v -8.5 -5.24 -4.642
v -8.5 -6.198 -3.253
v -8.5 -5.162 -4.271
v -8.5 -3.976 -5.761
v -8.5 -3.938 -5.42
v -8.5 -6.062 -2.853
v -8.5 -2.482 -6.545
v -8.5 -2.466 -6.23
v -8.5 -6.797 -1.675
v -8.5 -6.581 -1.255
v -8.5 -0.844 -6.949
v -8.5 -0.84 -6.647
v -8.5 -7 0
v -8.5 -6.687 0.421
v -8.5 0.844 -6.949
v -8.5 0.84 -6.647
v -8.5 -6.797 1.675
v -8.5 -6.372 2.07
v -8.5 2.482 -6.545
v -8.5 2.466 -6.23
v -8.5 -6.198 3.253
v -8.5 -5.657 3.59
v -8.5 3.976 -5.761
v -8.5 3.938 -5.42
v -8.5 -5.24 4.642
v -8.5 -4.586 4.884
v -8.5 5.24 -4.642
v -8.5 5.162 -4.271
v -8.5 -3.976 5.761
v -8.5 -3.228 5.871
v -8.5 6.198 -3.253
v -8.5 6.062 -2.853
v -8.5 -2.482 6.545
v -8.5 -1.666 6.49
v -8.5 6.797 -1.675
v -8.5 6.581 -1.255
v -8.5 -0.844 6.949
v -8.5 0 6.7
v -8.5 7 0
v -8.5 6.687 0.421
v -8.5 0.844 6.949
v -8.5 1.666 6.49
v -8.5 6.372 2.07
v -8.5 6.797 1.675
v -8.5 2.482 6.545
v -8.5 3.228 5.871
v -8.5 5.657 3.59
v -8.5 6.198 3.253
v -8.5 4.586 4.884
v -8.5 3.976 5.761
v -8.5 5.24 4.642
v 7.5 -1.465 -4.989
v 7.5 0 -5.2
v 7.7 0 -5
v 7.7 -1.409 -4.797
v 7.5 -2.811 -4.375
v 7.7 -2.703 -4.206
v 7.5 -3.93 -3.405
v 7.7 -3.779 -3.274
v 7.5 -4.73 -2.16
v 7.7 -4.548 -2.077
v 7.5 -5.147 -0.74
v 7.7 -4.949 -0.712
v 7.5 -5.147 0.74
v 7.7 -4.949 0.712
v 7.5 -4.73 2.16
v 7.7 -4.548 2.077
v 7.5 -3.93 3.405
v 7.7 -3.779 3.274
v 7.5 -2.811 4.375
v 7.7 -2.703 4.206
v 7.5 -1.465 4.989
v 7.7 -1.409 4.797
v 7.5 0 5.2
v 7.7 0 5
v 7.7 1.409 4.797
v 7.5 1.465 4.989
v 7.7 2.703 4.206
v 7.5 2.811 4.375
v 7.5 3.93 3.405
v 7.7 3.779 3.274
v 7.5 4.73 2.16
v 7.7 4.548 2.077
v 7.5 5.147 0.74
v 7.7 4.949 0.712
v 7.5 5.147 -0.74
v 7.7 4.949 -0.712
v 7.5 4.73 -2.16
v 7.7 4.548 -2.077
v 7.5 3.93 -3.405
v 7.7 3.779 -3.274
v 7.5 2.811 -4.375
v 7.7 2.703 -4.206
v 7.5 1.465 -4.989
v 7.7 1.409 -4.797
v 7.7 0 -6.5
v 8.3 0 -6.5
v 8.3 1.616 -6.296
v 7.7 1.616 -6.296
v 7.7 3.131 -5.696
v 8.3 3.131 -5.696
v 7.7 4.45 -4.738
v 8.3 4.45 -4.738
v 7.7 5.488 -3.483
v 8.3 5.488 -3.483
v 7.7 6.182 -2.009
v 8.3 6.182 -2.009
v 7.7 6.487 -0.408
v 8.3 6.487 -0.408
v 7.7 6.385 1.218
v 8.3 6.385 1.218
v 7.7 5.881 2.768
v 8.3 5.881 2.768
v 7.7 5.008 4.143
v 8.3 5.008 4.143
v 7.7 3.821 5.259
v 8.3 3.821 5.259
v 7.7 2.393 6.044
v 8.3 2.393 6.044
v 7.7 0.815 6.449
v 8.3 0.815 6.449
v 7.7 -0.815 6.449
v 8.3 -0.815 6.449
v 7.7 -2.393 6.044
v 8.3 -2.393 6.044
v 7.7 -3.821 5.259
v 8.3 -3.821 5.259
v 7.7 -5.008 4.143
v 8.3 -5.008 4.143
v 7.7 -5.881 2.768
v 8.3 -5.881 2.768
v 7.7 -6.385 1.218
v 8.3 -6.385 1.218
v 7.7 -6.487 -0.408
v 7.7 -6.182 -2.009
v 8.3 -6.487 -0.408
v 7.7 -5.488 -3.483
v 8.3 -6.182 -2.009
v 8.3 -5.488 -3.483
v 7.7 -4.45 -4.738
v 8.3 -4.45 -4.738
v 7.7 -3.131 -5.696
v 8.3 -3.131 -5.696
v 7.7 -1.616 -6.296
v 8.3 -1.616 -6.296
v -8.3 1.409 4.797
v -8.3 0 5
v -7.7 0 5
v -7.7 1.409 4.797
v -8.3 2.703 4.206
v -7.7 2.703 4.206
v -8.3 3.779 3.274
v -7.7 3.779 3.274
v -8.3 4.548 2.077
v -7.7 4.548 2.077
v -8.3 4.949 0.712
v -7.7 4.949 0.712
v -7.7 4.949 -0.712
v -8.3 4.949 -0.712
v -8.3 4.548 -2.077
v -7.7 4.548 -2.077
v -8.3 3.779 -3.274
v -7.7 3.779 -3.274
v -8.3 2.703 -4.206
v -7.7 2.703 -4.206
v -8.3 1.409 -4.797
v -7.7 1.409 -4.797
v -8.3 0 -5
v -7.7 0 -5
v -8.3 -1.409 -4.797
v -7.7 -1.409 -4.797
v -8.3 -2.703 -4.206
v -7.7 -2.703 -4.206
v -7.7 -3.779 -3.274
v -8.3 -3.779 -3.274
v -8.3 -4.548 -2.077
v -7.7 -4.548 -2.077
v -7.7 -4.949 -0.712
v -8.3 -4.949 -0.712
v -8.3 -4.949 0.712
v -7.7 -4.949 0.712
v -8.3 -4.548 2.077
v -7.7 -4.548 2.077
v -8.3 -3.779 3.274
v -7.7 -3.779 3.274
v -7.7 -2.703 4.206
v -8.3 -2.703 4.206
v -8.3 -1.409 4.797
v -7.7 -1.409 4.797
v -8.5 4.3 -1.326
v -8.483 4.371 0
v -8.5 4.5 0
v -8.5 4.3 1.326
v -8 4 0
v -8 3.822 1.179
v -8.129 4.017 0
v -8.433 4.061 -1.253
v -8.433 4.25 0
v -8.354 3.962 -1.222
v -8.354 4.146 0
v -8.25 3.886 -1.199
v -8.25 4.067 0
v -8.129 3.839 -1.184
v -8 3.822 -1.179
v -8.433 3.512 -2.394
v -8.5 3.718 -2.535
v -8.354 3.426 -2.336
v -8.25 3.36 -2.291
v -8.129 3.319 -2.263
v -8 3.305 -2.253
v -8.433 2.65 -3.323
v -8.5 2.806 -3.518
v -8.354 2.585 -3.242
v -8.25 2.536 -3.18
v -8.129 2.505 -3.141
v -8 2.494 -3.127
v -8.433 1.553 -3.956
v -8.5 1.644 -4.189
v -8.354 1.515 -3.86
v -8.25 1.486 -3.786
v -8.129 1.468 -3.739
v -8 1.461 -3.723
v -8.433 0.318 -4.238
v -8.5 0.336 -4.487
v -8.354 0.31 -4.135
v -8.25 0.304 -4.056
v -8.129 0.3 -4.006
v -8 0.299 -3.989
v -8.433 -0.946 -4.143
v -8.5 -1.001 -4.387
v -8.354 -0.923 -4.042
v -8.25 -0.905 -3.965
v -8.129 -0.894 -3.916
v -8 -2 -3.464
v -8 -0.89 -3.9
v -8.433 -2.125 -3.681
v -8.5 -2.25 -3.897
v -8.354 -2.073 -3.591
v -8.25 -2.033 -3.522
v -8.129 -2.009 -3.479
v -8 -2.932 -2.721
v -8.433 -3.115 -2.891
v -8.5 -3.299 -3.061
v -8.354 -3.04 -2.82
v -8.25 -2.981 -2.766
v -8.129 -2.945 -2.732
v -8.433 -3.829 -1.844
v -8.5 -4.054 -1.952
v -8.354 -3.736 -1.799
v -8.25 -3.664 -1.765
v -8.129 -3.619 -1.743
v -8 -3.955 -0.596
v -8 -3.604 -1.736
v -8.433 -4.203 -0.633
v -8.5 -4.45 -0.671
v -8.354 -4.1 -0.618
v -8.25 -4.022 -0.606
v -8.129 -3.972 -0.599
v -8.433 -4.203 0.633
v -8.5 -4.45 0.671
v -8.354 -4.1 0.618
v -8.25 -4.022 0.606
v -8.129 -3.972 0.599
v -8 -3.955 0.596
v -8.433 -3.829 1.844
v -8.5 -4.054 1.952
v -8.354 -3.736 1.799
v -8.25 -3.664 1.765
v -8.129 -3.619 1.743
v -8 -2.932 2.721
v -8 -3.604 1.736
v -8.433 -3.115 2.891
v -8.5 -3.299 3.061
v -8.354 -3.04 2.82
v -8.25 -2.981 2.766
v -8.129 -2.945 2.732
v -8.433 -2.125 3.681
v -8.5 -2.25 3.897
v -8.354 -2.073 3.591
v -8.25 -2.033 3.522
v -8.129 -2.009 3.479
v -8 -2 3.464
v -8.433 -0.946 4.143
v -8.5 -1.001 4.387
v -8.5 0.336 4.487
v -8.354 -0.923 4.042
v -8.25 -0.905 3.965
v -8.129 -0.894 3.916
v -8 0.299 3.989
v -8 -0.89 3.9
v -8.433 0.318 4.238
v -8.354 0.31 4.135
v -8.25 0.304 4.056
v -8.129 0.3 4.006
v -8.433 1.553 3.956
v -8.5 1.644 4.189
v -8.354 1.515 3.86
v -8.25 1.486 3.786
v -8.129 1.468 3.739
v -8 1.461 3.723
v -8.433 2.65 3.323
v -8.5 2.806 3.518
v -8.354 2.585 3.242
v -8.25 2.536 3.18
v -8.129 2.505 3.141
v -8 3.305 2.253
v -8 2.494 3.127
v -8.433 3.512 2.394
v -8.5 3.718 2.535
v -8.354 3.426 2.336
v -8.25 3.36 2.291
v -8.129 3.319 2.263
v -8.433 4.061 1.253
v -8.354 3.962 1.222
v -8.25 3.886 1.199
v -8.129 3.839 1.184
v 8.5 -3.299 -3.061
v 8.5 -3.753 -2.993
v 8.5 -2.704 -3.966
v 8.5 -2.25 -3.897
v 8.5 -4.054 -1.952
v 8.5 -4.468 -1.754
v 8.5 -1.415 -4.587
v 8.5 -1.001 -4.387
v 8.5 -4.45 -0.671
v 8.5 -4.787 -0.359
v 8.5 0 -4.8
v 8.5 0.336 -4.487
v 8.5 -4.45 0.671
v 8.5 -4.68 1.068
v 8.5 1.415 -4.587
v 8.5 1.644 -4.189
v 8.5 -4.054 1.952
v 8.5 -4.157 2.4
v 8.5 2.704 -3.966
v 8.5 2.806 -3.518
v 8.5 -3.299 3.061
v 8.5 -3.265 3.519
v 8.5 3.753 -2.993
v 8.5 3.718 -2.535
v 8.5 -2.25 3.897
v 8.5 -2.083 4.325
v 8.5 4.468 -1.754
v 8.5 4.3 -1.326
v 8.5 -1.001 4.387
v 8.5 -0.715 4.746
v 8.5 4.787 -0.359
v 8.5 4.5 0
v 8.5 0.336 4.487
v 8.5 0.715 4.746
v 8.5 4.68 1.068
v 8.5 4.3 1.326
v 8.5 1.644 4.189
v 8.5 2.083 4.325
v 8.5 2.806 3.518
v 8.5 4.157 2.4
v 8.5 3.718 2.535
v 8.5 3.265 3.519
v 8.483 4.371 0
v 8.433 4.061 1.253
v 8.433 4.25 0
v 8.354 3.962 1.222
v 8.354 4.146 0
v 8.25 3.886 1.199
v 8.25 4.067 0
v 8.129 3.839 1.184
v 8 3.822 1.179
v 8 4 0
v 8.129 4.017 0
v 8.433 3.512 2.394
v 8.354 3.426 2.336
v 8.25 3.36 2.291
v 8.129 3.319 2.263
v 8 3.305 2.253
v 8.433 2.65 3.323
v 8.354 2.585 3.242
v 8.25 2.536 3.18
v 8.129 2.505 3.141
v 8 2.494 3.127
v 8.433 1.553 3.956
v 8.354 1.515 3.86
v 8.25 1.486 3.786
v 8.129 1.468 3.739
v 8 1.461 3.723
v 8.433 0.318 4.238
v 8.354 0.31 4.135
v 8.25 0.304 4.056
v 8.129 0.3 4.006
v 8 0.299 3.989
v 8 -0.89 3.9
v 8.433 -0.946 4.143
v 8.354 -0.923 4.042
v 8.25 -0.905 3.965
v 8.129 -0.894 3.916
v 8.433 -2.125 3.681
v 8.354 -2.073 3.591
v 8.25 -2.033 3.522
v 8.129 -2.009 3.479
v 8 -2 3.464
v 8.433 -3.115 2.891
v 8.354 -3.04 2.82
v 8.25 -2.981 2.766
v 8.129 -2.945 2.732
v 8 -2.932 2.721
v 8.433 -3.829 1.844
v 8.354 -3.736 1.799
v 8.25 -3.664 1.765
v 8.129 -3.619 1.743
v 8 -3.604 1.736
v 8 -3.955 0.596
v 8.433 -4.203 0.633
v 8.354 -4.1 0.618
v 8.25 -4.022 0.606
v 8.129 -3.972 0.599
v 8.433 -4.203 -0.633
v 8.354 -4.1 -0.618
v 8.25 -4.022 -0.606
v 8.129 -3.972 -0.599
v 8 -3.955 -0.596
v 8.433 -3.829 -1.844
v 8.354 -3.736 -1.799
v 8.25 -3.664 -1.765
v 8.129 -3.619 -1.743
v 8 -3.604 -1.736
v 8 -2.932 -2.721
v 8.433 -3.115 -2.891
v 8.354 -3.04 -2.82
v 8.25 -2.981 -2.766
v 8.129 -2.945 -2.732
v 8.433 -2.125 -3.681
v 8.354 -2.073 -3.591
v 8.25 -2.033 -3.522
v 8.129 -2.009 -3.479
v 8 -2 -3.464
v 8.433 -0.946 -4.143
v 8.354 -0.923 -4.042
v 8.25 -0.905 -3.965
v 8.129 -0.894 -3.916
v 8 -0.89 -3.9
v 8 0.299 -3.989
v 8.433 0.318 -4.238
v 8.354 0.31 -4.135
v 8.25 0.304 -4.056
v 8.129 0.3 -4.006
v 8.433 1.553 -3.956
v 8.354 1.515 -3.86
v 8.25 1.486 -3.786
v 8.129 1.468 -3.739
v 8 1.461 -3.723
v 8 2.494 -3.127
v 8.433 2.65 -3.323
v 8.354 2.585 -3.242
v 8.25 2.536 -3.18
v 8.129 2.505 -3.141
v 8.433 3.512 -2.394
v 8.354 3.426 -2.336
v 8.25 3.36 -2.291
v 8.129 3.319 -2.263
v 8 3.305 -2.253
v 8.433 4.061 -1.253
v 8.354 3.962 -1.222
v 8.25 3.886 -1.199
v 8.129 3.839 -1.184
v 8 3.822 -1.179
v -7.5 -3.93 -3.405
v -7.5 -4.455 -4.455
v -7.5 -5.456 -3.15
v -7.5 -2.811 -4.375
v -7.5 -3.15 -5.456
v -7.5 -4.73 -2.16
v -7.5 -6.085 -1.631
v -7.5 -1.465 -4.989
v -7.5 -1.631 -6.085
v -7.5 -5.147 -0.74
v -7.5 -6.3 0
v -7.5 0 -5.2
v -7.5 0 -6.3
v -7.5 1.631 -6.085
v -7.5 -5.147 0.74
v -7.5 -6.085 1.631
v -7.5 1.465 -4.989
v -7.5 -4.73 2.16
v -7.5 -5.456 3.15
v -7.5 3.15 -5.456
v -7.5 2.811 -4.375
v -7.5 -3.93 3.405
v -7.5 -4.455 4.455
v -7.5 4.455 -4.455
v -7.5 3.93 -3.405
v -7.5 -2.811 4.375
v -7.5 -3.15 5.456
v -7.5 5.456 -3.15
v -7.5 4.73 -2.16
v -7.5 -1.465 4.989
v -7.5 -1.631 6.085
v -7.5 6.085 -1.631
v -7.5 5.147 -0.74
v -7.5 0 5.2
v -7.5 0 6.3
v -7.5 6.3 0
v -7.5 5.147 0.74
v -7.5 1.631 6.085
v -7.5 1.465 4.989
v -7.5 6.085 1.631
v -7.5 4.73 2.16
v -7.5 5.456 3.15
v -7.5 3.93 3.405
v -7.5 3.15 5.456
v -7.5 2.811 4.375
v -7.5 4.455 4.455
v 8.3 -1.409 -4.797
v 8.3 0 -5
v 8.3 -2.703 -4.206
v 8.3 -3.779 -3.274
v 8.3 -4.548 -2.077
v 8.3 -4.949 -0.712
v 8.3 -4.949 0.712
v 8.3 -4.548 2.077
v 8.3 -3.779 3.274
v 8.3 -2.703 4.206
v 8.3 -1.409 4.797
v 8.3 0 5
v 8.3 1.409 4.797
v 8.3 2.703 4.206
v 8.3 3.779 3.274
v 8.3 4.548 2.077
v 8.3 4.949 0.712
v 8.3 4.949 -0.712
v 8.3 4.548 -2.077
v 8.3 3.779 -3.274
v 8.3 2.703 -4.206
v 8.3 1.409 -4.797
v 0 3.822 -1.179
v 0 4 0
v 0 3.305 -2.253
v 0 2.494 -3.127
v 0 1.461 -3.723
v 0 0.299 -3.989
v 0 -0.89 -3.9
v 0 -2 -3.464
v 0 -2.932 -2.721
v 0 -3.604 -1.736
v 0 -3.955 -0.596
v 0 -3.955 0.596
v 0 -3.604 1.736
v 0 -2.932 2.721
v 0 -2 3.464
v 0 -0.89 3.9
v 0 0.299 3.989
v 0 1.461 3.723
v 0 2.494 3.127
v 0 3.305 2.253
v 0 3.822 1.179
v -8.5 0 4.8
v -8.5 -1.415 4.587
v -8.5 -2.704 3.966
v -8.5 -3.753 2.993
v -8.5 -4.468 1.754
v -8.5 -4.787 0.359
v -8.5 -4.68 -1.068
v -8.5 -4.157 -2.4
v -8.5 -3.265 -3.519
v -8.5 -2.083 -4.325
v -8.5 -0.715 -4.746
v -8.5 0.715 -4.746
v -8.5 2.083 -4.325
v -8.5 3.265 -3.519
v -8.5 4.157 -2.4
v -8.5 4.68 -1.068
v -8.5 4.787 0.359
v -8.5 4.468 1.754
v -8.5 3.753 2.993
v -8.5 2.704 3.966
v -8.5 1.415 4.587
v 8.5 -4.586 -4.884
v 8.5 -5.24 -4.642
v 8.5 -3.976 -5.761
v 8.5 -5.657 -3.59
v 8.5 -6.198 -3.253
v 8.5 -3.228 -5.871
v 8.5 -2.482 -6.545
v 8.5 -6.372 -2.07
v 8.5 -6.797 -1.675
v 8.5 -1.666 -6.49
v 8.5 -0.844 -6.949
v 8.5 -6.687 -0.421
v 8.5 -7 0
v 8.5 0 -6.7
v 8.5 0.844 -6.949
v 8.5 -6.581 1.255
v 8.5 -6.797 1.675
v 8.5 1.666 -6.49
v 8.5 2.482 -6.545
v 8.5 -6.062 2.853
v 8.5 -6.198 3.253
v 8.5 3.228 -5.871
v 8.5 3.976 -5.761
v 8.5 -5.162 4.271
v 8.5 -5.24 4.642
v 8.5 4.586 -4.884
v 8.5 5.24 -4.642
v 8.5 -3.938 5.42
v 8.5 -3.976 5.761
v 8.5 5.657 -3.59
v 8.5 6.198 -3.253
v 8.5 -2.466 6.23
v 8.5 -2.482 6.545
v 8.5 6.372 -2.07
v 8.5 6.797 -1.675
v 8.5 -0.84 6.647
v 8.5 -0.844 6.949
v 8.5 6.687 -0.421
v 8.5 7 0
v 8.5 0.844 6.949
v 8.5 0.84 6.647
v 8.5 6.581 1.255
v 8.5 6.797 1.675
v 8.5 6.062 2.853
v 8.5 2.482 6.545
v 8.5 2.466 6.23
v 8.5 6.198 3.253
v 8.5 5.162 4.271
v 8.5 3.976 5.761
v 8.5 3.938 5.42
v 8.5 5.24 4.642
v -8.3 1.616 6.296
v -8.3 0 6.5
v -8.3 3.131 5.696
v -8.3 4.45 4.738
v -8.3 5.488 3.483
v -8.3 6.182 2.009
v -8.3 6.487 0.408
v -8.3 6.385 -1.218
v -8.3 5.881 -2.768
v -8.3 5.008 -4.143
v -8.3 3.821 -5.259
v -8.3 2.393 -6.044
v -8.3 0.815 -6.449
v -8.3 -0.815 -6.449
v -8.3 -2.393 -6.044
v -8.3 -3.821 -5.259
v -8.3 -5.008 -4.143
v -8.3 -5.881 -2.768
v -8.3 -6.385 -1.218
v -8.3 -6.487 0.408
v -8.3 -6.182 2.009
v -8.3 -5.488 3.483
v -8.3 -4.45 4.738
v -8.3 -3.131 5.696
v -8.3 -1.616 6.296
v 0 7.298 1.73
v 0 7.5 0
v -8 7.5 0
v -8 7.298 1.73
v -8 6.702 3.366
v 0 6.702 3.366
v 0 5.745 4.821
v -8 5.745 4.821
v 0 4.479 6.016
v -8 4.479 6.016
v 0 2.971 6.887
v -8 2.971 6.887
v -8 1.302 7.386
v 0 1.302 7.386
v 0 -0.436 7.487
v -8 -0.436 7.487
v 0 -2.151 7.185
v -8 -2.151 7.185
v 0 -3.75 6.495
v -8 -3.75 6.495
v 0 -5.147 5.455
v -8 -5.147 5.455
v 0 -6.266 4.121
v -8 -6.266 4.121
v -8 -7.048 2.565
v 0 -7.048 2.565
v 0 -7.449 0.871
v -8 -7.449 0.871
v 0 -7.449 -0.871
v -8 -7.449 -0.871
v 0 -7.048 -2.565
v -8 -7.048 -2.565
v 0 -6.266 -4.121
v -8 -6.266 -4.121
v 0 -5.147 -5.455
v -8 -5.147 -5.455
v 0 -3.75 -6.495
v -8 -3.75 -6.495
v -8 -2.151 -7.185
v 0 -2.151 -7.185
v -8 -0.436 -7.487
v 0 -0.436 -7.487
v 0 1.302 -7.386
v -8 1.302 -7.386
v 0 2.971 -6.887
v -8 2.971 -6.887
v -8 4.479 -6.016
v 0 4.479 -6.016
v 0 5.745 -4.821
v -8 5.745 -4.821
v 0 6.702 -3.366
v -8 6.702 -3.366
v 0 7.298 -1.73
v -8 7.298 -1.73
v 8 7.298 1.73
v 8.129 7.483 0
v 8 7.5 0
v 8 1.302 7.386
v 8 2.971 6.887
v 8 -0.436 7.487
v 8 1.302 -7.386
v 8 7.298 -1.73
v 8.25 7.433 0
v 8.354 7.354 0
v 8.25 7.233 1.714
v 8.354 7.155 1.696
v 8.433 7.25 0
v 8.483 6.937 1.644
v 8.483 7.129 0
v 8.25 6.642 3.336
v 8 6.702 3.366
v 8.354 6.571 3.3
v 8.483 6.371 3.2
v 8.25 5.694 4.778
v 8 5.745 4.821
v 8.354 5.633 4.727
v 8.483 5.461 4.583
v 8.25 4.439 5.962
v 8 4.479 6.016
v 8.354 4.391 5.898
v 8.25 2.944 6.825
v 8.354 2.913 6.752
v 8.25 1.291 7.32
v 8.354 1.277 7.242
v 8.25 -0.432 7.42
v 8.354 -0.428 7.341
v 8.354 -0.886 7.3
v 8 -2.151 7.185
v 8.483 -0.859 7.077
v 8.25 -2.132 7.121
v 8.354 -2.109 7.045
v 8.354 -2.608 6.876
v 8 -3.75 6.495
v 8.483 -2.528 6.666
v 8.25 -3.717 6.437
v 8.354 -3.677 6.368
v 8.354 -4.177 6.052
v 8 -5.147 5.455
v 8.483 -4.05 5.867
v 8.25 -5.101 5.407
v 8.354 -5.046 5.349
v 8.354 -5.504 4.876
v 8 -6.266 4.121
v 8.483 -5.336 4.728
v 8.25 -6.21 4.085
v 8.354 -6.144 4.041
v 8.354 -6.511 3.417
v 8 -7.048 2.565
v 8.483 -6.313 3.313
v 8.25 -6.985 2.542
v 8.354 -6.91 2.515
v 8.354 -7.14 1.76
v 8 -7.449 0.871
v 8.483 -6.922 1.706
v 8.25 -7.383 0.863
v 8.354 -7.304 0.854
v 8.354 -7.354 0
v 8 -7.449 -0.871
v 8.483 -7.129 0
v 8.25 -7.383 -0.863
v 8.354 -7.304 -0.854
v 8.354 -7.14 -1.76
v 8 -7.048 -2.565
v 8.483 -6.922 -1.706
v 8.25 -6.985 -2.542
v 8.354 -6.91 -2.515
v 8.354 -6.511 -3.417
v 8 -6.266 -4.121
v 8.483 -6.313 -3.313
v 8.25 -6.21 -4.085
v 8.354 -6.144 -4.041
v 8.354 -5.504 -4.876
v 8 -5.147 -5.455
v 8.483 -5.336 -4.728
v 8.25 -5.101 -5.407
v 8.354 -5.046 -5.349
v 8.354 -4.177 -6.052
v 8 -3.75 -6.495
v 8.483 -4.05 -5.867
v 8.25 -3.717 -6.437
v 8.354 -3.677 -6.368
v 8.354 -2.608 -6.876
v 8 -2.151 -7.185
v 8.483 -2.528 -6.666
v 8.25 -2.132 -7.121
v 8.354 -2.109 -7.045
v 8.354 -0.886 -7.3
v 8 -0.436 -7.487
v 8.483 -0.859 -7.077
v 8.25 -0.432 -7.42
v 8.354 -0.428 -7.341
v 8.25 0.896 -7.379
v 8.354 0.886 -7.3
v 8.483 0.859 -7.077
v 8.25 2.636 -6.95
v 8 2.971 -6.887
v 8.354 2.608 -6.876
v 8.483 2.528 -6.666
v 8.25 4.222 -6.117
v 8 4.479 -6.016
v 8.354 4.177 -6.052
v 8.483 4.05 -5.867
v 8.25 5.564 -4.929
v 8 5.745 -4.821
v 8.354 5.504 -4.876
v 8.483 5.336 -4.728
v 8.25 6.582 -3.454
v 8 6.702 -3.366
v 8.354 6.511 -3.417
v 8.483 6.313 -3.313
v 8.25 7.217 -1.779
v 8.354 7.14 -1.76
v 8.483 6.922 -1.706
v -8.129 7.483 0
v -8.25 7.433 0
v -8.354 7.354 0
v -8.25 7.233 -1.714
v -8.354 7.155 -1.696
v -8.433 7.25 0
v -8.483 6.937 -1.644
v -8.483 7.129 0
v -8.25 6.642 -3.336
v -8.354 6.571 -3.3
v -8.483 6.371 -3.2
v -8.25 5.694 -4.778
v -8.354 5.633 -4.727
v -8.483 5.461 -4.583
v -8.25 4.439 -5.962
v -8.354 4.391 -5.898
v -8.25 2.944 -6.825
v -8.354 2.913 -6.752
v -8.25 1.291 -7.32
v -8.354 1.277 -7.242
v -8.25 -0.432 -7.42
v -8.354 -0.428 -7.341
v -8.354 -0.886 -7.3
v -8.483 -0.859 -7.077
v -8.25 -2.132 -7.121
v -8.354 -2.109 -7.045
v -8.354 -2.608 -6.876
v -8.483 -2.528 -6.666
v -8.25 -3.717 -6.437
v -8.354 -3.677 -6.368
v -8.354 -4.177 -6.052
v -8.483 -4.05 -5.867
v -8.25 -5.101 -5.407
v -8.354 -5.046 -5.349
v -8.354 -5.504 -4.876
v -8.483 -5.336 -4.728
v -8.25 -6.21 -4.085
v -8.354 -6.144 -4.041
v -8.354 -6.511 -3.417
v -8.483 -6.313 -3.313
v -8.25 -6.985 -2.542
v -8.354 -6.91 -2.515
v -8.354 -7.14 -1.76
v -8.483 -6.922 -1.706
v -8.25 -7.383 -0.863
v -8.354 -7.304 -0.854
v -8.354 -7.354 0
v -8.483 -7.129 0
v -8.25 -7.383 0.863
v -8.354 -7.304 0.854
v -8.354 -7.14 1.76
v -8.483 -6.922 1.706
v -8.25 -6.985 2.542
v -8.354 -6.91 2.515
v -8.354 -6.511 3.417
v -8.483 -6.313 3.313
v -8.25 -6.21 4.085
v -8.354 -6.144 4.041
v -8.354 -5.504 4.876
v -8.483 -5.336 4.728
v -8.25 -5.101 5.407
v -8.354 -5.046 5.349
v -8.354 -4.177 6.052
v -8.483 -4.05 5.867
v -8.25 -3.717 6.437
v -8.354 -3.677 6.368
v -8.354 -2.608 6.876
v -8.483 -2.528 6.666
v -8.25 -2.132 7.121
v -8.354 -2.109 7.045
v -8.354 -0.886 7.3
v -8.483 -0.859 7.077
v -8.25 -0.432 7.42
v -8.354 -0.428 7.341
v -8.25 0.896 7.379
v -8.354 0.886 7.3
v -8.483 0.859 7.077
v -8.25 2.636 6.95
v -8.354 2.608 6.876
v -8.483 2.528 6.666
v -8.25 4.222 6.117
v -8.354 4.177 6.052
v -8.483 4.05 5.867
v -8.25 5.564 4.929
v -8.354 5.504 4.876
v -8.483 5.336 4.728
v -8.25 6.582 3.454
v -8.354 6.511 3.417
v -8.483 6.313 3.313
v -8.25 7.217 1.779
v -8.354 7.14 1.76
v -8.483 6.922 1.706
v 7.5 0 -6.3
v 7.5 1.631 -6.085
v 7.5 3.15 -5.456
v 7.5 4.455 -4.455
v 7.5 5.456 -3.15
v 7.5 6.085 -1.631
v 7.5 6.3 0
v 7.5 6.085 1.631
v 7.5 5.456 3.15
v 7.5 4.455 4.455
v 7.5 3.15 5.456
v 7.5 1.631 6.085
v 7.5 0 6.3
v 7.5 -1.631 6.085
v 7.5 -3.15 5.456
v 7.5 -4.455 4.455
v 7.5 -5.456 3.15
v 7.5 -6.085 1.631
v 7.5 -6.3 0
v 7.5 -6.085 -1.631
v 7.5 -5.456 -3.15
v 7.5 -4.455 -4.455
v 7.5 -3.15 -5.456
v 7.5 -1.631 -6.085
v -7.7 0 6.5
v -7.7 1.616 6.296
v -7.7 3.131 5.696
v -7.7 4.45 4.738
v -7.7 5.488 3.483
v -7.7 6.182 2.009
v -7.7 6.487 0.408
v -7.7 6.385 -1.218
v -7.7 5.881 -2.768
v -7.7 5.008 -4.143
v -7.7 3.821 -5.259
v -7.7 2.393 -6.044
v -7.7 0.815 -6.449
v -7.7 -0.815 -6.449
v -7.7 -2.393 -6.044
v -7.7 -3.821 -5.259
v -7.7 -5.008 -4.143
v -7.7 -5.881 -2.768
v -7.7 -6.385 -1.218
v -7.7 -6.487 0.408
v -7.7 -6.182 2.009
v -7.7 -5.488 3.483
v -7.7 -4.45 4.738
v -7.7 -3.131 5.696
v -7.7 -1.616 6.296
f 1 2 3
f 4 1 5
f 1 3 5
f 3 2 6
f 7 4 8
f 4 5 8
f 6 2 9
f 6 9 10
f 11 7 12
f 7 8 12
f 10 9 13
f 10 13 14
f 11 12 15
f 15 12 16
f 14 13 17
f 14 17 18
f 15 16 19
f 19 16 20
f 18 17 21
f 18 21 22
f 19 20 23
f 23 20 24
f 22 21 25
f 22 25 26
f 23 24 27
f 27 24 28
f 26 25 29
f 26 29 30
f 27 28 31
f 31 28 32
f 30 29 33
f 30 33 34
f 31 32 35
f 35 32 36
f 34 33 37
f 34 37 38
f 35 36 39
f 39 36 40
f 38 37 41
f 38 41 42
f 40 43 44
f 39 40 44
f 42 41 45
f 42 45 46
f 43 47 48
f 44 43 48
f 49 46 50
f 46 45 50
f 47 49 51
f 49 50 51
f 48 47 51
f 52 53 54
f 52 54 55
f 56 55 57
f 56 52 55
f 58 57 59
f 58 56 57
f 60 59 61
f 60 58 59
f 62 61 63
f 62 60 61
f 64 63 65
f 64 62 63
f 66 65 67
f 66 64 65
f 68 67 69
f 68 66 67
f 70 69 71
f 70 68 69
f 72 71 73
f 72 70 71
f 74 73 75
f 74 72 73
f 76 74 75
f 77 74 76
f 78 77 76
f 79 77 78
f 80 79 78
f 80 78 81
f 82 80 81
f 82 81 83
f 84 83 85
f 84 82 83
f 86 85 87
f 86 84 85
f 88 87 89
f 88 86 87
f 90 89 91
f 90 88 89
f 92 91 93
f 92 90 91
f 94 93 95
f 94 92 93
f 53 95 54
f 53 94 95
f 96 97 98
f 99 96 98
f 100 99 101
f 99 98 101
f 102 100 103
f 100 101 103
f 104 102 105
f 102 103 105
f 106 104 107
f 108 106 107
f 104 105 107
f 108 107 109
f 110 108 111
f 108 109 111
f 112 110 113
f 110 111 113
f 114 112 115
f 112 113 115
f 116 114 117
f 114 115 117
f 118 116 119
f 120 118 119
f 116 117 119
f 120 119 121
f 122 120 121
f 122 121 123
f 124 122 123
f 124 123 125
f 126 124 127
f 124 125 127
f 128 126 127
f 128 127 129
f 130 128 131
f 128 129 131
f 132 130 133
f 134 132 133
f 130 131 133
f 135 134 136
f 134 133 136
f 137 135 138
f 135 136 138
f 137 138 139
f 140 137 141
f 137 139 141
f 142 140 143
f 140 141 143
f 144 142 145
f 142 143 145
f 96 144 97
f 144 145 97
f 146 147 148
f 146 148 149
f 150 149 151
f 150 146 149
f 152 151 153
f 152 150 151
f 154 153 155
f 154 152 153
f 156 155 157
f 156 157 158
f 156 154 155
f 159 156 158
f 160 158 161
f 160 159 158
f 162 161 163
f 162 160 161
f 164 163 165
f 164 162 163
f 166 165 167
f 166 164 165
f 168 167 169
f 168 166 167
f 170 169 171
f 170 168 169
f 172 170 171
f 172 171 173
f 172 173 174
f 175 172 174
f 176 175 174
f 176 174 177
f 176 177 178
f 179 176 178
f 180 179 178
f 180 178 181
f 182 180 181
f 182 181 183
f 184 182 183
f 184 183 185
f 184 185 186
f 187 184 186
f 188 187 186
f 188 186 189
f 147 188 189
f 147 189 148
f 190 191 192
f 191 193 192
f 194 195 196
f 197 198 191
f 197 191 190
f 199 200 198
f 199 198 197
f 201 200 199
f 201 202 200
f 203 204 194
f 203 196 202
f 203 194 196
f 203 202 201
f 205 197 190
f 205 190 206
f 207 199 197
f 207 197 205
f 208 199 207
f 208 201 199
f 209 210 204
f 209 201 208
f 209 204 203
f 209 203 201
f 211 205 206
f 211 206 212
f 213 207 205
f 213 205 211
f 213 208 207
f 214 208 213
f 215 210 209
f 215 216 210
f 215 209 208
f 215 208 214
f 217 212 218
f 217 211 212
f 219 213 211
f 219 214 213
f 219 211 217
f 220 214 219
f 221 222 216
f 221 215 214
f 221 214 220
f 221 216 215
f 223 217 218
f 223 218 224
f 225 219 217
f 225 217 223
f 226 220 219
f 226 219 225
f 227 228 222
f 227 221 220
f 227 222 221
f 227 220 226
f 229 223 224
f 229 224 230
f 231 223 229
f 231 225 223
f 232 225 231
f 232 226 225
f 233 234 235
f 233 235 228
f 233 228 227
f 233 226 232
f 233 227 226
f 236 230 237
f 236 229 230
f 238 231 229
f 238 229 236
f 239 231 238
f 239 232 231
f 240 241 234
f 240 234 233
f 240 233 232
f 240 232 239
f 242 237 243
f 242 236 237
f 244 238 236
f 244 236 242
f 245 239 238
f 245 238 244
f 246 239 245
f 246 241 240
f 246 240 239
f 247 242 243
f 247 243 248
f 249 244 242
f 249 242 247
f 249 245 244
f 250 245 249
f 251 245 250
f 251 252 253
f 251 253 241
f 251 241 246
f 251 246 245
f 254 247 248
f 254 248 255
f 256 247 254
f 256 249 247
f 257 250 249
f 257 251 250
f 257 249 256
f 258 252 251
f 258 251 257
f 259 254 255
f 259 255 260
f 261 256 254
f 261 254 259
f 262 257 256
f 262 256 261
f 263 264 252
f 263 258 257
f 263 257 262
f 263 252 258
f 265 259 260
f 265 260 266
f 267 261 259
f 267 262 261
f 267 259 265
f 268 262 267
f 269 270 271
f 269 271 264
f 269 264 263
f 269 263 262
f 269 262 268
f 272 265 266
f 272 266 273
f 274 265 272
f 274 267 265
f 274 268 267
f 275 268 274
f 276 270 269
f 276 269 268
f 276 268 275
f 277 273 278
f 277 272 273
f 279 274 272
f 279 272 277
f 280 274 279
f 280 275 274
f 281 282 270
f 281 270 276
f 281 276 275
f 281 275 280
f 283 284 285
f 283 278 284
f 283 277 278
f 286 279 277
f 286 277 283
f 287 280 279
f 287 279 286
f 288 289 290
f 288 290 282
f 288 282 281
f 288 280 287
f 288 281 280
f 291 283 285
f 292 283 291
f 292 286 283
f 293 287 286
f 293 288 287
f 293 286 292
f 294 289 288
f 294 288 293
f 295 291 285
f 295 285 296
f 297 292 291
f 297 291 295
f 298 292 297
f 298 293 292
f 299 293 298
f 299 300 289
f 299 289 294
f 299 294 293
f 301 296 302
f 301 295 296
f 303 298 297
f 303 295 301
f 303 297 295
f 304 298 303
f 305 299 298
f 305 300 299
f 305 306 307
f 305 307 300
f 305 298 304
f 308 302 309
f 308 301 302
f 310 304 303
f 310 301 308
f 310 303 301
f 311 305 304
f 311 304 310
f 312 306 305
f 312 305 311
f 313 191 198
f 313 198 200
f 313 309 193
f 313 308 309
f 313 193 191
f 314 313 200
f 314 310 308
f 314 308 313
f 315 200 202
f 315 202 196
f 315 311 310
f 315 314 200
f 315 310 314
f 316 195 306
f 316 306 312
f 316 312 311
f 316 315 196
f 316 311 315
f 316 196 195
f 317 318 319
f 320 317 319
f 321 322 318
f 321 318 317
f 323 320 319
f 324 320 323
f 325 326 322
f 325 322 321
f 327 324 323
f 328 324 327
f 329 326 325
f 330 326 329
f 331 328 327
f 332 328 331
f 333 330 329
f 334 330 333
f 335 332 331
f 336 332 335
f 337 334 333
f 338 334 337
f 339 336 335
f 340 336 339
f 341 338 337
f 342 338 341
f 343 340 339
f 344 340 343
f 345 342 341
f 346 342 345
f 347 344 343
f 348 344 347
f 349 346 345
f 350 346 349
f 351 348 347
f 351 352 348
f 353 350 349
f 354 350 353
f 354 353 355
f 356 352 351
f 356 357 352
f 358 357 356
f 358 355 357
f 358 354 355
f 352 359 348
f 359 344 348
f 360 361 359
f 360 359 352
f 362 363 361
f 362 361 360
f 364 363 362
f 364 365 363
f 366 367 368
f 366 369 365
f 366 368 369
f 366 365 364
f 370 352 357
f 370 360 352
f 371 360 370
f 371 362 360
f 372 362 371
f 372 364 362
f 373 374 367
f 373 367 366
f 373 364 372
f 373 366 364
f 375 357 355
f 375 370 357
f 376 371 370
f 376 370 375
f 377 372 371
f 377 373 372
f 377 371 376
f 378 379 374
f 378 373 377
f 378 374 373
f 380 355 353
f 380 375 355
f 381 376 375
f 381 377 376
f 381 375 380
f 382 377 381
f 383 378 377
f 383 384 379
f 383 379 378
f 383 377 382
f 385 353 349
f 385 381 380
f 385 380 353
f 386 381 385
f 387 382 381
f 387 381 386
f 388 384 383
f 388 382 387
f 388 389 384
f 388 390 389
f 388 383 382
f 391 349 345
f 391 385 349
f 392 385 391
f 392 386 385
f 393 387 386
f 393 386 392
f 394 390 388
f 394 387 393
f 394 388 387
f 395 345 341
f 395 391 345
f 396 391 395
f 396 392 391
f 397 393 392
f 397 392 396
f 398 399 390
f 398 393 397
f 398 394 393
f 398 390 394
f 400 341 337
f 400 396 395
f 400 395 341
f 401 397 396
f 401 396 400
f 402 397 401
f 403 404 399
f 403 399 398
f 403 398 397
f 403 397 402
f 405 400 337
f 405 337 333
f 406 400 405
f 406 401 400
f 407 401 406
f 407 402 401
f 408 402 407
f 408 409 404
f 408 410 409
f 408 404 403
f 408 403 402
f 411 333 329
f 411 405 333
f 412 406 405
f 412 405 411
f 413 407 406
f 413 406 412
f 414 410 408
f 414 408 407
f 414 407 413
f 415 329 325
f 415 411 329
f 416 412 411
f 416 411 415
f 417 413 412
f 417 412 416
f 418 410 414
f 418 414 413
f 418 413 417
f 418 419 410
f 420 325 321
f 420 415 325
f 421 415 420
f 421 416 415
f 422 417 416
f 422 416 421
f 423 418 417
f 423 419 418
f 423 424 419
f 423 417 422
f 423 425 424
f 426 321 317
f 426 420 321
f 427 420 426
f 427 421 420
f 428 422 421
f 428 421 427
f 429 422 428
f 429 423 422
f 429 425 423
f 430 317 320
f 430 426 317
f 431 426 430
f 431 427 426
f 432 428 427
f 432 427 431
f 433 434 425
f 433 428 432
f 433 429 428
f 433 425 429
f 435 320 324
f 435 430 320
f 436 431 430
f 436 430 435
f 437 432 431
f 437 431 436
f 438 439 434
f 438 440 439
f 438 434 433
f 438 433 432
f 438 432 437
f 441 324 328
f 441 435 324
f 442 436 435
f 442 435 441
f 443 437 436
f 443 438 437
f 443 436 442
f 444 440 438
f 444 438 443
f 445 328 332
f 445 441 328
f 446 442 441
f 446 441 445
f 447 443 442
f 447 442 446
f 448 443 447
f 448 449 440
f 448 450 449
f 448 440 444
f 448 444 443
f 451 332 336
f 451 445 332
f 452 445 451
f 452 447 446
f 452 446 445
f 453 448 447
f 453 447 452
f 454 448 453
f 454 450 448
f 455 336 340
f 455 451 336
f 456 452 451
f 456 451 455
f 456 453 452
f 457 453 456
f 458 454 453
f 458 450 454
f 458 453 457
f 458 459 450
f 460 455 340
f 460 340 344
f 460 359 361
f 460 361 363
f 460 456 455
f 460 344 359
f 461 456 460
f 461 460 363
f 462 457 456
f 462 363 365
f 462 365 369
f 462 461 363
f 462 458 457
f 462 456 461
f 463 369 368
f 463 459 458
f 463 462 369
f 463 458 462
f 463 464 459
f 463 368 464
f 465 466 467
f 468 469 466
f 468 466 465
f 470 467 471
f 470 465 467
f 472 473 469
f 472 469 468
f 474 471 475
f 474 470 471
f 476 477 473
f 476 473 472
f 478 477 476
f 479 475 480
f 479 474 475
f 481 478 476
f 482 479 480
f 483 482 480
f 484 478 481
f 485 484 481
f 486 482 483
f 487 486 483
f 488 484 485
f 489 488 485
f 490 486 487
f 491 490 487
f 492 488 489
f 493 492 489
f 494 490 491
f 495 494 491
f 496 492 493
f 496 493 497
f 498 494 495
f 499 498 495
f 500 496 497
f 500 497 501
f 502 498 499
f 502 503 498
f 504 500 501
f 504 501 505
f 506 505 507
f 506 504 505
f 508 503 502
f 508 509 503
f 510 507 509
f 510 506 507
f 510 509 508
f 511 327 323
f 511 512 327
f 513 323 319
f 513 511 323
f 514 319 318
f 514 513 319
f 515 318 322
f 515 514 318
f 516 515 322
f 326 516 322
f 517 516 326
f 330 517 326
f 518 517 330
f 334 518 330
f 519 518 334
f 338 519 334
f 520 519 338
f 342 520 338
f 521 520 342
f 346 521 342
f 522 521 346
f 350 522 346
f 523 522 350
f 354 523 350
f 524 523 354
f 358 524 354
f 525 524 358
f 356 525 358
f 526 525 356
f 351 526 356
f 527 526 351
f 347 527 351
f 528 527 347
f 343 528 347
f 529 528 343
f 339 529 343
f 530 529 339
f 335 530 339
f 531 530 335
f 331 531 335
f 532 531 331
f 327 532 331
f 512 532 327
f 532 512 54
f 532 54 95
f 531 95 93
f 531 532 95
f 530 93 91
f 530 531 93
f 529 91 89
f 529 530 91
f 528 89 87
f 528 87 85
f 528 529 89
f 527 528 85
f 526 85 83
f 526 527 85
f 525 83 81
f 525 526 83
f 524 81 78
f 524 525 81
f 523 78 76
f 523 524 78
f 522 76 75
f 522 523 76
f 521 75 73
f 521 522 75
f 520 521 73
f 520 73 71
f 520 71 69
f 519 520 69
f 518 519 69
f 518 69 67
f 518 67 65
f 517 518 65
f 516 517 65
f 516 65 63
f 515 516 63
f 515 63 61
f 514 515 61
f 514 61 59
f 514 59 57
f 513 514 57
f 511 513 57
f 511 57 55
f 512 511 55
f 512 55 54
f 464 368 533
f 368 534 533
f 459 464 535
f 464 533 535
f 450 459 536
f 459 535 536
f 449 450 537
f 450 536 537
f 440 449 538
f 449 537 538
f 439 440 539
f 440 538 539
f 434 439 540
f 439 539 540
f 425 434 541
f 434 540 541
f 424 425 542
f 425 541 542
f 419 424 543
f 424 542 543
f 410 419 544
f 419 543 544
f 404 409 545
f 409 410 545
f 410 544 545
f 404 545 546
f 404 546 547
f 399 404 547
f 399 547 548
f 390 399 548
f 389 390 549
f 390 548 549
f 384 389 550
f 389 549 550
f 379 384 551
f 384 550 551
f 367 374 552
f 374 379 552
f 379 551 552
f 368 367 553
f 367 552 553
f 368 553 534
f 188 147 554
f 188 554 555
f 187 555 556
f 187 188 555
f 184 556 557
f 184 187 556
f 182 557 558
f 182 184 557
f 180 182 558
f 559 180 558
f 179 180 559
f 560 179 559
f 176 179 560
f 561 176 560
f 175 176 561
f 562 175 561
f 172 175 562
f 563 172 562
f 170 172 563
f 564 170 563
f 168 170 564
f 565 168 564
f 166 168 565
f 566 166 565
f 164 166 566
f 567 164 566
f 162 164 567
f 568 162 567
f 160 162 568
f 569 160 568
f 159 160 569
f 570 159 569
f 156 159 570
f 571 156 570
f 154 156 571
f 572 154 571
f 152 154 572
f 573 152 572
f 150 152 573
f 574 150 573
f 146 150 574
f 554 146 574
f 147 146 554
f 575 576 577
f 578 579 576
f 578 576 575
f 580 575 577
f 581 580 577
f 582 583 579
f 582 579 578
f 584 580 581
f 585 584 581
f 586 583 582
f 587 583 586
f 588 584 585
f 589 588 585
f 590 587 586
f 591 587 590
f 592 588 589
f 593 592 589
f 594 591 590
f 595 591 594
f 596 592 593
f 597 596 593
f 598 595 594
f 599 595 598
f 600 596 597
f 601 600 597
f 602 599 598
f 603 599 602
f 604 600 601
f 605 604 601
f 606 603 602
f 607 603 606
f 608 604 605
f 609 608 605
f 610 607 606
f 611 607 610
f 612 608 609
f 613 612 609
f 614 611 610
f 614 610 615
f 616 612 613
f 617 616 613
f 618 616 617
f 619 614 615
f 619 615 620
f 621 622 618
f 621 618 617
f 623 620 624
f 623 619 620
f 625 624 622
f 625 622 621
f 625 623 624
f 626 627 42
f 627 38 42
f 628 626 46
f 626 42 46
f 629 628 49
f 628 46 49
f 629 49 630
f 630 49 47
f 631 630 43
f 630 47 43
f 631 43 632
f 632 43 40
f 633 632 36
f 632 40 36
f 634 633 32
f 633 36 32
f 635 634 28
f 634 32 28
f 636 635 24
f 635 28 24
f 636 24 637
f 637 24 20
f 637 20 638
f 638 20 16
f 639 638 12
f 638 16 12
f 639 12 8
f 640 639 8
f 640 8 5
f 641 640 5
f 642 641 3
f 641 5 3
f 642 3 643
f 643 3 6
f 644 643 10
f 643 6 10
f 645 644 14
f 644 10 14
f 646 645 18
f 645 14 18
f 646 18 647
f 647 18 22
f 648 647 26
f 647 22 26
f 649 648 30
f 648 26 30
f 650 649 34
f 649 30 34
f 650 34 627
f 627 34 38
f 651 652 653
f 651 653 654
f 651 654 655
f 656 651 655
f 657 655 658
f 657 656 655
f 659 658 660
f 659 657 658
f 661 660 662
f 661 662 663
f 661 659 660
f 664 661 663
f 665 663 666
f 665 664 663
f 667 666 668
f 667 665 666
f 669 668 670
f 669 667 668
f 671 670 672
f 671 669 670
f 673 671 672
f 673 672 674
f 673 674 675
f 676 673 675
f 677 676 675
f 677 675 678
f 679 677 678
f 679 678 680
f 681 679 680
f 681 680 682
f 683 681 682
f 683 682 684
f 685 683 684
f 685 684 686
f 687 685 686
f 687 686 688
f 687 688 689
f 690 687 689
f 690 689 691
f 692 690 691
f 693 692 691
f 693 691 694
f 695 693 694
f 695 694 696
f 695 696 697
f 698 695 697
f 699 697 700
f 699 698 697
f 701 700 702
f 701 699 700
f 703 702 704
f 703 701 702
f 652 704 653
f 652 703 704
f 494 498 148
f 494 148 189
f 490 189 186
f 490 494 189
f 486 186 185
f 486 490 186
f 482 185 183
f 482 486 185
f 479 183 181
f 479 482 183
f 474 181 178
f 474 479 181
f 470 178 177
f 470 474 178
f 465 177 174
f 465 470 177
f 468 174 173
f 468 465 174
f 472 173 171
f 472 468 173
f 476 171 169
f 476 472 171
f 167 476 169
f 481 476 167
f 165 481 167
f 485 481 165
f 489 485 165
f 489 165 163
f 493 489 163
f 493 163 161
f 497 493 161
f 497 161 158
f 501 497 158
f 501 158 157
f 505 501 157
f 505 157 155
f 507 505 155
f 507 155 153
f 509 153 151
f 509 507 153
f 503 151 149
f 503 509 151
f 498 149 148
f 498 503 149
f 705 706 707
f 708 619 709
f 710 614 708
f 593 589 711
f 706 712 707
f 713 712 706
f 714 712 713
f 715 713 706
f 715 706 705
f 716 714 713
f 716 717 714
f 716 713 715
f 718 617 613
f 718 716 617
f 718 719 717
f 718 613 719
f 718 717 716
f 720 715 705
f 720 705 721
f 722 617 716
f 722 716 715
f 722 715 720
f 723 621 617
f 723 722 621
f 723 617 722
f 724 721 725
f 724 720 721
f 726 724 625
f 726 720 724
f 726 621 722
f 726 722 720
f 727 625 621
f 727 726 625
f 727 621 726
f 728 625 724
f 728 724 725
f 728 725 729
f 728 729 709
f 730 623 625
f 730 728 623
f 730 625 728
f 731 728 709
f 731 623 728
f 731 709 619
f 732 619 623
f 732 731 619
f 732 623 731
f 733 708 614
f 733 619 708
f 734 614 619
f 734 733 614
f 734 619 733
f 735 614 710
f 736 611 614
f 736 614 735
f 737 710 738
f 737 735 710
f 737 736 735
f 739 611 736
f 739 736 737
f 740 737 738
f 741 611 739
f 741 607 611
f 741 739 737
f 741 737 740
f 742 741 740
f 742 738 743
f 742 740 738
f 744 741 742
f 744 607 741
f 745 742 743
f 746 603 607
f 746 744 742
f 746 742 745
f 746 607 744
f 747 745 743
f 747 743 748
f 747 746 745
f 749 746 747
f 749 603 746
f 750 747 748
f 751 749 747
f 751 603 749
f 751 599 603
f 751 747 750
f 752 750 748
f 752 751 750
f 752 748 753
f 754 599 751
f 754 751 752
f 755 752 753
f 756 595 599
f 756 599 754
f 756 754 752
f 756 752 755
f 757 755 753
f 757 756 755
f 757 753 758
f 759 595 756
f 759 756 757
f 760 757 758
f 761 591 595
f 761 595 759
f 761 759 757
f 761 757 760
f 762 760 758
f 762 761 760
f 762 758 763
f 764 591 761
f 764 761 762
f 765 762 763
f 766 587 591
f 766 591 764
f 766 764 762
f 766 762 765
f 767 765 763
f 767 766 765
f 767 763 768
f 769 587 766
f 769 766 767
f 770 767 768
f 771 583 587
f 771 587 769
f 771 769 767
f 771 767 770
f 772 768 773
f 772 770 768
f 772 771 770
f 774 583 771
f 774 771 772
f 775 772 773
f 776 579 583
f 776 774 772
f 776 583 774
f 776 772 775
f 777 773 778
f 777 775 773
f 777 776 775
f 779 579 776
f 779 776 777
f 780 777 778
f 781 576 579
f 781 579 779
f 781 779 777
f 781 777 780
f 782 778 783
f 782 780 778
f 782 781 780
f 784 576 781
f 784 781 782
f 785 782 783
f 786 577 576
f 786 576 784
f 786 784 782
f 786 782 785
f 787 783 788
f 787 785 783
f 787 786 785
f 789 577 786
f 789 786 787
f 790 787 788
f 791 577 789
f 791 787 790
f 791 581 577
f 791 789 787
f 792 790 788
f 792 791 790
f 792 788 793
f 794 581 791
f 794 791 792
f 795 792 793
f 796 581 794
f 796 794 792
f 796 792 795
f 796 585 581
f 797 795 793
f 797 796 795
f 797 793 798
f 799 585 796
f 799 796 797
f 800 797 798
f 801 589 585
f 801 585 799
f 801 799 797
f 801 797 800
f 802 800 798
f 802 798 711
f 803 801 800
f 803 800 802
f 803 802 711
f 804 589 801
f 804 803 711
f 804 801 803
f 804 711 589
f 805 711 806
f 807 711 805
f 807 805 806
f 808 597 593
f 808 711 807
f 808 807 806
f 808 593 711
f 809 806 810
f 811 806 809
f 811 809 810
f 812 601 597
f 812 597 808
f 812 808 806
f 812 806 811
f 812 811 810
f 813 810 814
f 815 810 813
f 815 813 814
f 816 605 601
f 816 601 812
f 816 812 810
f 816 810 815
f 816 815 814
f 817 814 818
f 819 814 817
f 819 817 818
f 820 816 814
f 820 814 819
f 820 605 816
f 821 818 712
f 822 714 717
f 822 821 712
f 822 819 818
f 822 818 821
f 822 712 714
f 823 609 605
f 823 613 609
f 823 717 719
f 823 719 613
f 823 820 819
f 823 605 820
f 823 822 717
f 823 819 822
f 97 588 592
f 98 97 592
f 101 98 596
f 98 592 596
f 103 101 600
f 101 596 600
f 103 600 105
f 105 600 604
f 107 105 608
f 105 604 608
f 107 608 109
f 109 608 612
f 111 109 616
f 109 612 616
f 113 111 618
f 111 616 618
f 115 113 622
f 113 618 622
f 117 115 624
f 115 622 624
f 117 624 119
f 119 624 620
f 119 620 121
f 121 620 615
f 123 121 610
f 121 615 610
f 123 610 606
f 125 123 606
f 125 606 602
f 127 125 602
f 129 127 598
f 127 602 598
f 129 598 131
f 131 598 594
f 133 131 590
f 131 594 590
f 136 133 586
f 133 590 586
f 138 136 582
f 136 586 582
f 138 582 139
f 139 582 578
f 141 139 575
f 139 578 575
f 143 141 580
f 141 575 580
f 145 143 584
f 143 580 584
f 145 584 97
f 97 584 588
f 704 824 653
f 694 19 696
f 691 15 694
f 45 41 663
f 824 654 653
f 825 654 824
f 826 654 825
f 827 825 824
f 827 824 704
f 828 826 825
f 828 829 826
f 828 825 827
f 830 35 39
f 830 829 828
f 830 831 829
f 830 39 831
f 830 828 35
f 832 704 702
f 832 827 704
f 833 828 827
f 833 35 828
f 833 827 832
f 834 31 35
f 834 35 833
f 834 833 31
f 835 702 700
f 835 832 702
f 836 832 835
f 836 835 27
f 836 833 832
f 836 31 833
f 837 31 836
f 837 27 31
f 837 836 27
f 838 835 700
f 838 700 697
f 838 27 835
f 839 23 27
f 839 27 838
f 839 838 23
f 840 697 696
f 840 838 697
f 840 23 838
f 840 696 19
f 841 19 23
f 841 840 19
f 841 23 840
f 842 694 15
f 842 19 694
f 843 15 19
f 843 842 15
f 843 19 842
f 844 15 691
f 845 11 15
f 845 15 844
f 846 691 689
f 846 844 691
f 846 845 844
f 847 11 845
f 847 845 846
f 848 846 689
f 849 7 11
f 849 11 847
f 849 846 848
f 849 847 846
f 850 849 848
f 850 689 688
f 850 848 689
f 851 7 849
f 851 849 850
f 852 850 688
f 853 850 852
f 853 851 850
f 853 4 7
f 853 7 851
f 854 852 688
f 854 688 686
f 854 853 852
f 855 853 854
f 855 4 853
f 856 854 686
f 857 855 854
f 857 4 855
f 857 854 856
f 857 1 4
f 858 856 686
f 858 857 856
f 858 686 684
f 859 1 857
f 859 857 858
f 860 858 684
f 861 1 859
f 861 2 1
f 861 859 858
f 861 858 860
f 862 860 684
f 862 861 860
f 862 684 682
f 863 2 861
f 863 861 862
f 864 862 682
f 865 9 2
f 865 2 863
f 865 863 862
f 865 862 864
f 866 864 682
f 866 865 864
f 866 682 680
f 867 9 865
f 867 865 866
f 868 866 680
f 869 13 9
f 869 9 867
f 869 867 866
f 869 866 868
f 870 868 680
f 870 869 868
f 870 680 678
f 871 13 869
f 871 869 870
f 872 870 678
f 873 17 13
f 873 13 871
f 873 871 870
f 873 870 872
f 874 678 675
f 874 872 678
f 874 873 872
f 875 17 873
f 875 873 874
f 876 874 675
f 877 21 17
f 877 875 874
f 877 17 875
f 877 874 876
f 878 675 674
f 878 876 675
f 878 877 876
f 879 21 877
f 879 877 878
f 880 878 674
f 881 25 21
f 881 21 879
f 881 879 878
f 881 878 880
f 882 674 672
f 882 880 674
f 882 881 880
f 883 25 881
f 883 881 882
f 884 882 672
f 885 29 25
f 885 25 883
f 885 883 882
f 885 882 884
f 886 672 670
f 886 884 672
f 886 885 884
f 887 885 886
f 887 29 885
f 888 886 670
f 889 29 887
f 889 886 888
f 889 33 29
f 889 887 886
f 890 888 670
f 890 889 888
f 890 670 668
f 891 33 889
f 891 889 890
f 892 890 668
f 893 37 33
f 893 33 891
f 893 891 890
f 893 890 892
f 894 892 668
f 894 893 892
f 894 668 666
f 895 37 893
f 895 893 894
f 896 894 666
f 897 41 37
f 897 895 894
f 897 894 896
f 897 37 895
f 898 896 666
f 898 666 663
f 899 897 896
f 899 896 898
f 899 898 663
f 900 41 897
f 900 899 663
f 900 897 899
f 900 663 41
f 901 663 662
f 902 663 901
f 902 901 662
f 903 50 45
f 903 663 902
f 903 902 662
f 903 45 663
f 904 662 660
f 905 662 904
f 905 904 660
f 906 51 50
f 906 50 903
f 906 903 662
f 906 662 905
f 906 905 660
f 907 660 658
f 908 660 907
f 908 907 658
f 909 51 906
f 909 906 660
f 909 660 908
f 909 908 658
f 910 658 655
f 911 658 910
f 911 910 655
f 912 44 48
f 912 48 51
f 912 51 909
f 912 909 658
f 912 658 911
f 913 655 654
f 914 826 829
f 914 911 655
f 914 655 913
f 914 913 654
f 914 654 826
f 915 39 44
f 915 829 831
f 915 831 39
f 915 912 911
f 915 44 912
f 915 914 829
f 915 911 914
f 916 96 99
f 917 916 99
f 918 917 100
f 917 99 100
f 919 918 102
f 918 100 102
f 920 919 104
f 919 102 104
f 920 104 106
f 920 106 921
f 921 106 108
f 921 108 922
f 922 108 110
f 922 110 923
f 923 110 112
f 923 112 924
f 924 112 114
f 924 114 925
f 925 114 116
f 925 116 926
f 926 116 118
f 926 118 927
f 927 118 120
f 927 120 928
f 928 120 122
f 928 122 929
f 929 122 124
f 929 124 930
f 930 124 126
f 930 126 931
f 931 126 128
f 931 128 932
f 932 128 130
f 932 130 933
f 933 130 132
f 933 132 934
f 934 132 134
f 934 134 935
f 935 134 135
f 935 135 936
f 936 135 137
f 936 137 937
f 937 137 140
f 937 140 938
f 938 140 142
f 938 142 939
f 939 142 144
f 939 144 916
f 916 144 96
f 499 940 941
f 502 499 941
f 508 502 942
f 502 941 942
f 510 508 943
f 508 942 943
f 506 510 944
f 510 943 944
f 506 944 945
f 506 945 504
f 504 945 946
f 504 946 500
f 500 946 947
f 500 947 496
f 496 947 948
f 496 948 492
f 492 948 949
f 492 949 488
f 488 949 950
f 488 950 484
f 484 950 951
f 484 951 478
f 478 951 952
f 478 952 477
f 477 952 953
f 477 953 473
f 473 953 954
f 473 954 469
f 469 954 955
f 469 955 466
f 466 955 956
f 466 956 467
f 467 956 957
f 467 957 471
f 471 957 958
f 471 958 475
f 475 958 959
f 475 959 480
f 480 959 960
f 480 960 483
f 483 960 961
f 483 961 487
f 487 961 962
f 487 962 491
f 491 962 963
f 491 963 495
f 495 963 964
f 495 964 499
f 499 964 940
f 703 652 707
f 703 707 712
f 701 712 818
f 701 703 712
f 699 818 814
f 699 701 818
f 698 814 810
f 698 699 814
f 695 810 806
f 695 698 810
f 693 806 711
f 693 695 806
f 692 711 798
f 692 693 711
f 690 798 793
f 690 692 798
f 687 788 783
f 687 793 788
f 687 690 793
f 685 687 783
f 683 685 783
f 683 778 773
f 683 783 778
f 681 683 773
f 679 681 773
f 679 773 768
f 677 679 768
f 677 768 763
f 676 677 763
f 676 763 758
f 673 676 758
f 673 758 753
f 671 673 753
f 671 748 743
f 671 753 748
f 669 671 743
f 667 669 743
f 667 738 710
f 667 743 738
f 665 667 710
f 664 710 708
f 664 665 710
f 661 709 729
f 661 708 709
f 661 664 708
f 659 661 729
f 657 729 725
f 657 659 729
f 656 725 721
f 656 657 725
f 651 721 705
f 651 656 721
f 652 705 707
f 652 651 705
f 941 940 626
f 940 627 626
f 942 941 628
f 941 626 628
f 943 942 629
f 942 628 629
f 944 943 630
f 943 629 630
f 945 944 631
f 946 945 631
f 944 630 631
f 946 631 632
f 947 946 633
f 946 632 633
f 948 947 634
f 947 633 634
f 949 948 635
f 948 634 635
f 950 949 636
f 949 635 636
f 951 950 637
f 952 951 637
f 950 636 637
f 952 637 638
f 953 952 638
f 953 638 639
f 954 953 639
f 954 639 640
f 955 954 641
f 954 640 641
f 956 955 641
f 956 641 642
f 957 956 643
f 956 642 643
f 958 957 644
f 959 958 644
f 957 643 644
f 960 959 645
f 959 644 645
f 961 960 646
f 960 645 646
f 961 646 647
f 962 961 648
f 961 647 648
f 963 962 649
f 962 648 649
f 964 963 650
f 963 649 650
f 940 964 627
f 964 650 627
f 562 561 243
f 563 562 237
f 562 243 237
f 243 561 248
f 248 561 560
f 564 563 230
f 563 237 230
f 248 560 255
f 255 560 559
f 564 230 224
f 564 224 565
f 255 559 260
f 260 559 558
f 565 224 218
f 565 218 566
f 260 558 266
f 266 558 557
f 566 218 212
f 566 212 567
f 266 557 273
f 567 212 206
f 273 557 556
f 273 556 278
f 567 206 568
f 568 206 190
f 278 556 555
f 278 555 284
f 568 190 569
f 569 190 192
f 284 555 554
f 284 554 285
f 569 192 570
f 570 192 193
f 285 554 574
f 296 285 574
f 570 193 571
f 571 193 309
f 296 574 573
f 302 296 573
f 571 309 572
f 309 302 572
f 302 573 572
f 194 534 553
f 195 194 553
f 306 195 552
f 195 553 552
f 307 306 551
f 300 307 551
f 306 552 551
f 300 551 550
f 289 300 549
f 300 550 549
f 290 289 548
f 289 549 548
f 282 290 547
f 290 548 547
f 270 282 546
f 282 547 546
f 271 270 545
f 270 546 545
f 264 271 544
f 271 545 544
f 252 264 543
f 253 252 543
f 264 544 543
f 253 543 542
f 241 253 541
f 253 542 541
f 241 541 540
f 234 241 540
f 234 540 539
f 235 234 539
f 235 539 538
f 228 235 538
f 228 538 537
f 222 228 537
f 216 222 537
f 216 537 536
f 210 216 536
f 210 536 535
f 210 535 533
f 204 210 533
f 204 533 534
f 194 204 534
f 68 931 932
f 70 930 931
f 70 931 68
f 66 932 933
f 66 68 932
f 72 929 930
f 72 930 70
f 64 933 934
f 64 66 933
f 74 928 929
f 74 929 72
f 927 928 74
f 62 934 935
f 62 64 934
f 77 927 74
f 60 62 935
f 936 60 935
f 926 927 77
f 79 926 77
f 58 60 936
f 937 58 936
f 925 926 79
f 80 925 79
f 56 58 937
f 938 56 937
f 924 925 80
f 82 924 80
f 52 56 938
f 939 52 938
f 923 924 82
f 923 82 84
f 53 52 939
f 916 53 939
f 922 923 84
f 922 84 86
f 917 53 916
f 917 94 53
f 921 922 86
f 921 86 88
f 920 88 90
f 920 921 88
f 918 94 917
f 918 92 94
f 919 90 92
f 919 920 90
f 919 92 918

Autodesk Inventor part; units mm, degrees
ref_plane "YZ Plane" through (0, 0, 0) normal (1, 0, 0) x (0, 1, 0)
ref_plane "XZ Plane" through (0, 0, 0) normal (0, 1, 0) x (-1, 0, 0)
ref_plane "XY Plane" through (0, 0, 0) normal (0, 0, 1) x (1, 0, 0)
sketch "Эскиз1" plane through (0, 0, 0) normal (1, 0, 0) x (0, 1, 0)
  circle A0 centre (0, 0) radius 7.5
  circle A1 centre (0, 0) radius 4
  dimension "d0" = 15
  dimension "d1" = 8
extrude "Выдавливание1" add sketch "Эскиз1" along normal mid plane 17
sketch "Эскиз2" plane through (8.5, 0, 0) normal (1, 0, 0) x (0, 0, -1)
  circle A0 centre (0, 0) radius 5
  circle A1 centre (0, 0) radius 6.5
  dimension "d4" = 10
  dimension "d5" = 13
extrude "Выдавливание2" cut sketch "Эскиз2" against normal blind 1
sketch "Эскиз3" plane through (-8.5, 0, 0) normal (-1, 0, 0) x (0, 0, 1)
  circle A0 centre (0, 0) radius 6.5
  circle A1 centre (0, 0) radius 5
  dimension "d9" = 13
  dimension "d10" = 10
extrude "Выдавливание3" cut sketch "Эскиз3" against normal blind 1
fillet "Сопряжение1" radius 0.5 1 edges at (-8.5, -7.5, 0)
fillet "Сопряжение2" radius 0.5 3 edges at (-8.5, -4, 0) (8.5, -7.5, 0) (8.5, -4, 0)
chamfer "Фаска1" distance 0.2 angle 45 8 edges at (8.5, 0, 5) (8.5, 0, 6.5) (-8.5, 0, -5) (-8.5, 0, -6.5) (-7.5, 0, -5) (-7.5, 0, -6.5) (7.5, 0, 6.5) (7.5, 0, 5)
properties part number "LM8SUU"
